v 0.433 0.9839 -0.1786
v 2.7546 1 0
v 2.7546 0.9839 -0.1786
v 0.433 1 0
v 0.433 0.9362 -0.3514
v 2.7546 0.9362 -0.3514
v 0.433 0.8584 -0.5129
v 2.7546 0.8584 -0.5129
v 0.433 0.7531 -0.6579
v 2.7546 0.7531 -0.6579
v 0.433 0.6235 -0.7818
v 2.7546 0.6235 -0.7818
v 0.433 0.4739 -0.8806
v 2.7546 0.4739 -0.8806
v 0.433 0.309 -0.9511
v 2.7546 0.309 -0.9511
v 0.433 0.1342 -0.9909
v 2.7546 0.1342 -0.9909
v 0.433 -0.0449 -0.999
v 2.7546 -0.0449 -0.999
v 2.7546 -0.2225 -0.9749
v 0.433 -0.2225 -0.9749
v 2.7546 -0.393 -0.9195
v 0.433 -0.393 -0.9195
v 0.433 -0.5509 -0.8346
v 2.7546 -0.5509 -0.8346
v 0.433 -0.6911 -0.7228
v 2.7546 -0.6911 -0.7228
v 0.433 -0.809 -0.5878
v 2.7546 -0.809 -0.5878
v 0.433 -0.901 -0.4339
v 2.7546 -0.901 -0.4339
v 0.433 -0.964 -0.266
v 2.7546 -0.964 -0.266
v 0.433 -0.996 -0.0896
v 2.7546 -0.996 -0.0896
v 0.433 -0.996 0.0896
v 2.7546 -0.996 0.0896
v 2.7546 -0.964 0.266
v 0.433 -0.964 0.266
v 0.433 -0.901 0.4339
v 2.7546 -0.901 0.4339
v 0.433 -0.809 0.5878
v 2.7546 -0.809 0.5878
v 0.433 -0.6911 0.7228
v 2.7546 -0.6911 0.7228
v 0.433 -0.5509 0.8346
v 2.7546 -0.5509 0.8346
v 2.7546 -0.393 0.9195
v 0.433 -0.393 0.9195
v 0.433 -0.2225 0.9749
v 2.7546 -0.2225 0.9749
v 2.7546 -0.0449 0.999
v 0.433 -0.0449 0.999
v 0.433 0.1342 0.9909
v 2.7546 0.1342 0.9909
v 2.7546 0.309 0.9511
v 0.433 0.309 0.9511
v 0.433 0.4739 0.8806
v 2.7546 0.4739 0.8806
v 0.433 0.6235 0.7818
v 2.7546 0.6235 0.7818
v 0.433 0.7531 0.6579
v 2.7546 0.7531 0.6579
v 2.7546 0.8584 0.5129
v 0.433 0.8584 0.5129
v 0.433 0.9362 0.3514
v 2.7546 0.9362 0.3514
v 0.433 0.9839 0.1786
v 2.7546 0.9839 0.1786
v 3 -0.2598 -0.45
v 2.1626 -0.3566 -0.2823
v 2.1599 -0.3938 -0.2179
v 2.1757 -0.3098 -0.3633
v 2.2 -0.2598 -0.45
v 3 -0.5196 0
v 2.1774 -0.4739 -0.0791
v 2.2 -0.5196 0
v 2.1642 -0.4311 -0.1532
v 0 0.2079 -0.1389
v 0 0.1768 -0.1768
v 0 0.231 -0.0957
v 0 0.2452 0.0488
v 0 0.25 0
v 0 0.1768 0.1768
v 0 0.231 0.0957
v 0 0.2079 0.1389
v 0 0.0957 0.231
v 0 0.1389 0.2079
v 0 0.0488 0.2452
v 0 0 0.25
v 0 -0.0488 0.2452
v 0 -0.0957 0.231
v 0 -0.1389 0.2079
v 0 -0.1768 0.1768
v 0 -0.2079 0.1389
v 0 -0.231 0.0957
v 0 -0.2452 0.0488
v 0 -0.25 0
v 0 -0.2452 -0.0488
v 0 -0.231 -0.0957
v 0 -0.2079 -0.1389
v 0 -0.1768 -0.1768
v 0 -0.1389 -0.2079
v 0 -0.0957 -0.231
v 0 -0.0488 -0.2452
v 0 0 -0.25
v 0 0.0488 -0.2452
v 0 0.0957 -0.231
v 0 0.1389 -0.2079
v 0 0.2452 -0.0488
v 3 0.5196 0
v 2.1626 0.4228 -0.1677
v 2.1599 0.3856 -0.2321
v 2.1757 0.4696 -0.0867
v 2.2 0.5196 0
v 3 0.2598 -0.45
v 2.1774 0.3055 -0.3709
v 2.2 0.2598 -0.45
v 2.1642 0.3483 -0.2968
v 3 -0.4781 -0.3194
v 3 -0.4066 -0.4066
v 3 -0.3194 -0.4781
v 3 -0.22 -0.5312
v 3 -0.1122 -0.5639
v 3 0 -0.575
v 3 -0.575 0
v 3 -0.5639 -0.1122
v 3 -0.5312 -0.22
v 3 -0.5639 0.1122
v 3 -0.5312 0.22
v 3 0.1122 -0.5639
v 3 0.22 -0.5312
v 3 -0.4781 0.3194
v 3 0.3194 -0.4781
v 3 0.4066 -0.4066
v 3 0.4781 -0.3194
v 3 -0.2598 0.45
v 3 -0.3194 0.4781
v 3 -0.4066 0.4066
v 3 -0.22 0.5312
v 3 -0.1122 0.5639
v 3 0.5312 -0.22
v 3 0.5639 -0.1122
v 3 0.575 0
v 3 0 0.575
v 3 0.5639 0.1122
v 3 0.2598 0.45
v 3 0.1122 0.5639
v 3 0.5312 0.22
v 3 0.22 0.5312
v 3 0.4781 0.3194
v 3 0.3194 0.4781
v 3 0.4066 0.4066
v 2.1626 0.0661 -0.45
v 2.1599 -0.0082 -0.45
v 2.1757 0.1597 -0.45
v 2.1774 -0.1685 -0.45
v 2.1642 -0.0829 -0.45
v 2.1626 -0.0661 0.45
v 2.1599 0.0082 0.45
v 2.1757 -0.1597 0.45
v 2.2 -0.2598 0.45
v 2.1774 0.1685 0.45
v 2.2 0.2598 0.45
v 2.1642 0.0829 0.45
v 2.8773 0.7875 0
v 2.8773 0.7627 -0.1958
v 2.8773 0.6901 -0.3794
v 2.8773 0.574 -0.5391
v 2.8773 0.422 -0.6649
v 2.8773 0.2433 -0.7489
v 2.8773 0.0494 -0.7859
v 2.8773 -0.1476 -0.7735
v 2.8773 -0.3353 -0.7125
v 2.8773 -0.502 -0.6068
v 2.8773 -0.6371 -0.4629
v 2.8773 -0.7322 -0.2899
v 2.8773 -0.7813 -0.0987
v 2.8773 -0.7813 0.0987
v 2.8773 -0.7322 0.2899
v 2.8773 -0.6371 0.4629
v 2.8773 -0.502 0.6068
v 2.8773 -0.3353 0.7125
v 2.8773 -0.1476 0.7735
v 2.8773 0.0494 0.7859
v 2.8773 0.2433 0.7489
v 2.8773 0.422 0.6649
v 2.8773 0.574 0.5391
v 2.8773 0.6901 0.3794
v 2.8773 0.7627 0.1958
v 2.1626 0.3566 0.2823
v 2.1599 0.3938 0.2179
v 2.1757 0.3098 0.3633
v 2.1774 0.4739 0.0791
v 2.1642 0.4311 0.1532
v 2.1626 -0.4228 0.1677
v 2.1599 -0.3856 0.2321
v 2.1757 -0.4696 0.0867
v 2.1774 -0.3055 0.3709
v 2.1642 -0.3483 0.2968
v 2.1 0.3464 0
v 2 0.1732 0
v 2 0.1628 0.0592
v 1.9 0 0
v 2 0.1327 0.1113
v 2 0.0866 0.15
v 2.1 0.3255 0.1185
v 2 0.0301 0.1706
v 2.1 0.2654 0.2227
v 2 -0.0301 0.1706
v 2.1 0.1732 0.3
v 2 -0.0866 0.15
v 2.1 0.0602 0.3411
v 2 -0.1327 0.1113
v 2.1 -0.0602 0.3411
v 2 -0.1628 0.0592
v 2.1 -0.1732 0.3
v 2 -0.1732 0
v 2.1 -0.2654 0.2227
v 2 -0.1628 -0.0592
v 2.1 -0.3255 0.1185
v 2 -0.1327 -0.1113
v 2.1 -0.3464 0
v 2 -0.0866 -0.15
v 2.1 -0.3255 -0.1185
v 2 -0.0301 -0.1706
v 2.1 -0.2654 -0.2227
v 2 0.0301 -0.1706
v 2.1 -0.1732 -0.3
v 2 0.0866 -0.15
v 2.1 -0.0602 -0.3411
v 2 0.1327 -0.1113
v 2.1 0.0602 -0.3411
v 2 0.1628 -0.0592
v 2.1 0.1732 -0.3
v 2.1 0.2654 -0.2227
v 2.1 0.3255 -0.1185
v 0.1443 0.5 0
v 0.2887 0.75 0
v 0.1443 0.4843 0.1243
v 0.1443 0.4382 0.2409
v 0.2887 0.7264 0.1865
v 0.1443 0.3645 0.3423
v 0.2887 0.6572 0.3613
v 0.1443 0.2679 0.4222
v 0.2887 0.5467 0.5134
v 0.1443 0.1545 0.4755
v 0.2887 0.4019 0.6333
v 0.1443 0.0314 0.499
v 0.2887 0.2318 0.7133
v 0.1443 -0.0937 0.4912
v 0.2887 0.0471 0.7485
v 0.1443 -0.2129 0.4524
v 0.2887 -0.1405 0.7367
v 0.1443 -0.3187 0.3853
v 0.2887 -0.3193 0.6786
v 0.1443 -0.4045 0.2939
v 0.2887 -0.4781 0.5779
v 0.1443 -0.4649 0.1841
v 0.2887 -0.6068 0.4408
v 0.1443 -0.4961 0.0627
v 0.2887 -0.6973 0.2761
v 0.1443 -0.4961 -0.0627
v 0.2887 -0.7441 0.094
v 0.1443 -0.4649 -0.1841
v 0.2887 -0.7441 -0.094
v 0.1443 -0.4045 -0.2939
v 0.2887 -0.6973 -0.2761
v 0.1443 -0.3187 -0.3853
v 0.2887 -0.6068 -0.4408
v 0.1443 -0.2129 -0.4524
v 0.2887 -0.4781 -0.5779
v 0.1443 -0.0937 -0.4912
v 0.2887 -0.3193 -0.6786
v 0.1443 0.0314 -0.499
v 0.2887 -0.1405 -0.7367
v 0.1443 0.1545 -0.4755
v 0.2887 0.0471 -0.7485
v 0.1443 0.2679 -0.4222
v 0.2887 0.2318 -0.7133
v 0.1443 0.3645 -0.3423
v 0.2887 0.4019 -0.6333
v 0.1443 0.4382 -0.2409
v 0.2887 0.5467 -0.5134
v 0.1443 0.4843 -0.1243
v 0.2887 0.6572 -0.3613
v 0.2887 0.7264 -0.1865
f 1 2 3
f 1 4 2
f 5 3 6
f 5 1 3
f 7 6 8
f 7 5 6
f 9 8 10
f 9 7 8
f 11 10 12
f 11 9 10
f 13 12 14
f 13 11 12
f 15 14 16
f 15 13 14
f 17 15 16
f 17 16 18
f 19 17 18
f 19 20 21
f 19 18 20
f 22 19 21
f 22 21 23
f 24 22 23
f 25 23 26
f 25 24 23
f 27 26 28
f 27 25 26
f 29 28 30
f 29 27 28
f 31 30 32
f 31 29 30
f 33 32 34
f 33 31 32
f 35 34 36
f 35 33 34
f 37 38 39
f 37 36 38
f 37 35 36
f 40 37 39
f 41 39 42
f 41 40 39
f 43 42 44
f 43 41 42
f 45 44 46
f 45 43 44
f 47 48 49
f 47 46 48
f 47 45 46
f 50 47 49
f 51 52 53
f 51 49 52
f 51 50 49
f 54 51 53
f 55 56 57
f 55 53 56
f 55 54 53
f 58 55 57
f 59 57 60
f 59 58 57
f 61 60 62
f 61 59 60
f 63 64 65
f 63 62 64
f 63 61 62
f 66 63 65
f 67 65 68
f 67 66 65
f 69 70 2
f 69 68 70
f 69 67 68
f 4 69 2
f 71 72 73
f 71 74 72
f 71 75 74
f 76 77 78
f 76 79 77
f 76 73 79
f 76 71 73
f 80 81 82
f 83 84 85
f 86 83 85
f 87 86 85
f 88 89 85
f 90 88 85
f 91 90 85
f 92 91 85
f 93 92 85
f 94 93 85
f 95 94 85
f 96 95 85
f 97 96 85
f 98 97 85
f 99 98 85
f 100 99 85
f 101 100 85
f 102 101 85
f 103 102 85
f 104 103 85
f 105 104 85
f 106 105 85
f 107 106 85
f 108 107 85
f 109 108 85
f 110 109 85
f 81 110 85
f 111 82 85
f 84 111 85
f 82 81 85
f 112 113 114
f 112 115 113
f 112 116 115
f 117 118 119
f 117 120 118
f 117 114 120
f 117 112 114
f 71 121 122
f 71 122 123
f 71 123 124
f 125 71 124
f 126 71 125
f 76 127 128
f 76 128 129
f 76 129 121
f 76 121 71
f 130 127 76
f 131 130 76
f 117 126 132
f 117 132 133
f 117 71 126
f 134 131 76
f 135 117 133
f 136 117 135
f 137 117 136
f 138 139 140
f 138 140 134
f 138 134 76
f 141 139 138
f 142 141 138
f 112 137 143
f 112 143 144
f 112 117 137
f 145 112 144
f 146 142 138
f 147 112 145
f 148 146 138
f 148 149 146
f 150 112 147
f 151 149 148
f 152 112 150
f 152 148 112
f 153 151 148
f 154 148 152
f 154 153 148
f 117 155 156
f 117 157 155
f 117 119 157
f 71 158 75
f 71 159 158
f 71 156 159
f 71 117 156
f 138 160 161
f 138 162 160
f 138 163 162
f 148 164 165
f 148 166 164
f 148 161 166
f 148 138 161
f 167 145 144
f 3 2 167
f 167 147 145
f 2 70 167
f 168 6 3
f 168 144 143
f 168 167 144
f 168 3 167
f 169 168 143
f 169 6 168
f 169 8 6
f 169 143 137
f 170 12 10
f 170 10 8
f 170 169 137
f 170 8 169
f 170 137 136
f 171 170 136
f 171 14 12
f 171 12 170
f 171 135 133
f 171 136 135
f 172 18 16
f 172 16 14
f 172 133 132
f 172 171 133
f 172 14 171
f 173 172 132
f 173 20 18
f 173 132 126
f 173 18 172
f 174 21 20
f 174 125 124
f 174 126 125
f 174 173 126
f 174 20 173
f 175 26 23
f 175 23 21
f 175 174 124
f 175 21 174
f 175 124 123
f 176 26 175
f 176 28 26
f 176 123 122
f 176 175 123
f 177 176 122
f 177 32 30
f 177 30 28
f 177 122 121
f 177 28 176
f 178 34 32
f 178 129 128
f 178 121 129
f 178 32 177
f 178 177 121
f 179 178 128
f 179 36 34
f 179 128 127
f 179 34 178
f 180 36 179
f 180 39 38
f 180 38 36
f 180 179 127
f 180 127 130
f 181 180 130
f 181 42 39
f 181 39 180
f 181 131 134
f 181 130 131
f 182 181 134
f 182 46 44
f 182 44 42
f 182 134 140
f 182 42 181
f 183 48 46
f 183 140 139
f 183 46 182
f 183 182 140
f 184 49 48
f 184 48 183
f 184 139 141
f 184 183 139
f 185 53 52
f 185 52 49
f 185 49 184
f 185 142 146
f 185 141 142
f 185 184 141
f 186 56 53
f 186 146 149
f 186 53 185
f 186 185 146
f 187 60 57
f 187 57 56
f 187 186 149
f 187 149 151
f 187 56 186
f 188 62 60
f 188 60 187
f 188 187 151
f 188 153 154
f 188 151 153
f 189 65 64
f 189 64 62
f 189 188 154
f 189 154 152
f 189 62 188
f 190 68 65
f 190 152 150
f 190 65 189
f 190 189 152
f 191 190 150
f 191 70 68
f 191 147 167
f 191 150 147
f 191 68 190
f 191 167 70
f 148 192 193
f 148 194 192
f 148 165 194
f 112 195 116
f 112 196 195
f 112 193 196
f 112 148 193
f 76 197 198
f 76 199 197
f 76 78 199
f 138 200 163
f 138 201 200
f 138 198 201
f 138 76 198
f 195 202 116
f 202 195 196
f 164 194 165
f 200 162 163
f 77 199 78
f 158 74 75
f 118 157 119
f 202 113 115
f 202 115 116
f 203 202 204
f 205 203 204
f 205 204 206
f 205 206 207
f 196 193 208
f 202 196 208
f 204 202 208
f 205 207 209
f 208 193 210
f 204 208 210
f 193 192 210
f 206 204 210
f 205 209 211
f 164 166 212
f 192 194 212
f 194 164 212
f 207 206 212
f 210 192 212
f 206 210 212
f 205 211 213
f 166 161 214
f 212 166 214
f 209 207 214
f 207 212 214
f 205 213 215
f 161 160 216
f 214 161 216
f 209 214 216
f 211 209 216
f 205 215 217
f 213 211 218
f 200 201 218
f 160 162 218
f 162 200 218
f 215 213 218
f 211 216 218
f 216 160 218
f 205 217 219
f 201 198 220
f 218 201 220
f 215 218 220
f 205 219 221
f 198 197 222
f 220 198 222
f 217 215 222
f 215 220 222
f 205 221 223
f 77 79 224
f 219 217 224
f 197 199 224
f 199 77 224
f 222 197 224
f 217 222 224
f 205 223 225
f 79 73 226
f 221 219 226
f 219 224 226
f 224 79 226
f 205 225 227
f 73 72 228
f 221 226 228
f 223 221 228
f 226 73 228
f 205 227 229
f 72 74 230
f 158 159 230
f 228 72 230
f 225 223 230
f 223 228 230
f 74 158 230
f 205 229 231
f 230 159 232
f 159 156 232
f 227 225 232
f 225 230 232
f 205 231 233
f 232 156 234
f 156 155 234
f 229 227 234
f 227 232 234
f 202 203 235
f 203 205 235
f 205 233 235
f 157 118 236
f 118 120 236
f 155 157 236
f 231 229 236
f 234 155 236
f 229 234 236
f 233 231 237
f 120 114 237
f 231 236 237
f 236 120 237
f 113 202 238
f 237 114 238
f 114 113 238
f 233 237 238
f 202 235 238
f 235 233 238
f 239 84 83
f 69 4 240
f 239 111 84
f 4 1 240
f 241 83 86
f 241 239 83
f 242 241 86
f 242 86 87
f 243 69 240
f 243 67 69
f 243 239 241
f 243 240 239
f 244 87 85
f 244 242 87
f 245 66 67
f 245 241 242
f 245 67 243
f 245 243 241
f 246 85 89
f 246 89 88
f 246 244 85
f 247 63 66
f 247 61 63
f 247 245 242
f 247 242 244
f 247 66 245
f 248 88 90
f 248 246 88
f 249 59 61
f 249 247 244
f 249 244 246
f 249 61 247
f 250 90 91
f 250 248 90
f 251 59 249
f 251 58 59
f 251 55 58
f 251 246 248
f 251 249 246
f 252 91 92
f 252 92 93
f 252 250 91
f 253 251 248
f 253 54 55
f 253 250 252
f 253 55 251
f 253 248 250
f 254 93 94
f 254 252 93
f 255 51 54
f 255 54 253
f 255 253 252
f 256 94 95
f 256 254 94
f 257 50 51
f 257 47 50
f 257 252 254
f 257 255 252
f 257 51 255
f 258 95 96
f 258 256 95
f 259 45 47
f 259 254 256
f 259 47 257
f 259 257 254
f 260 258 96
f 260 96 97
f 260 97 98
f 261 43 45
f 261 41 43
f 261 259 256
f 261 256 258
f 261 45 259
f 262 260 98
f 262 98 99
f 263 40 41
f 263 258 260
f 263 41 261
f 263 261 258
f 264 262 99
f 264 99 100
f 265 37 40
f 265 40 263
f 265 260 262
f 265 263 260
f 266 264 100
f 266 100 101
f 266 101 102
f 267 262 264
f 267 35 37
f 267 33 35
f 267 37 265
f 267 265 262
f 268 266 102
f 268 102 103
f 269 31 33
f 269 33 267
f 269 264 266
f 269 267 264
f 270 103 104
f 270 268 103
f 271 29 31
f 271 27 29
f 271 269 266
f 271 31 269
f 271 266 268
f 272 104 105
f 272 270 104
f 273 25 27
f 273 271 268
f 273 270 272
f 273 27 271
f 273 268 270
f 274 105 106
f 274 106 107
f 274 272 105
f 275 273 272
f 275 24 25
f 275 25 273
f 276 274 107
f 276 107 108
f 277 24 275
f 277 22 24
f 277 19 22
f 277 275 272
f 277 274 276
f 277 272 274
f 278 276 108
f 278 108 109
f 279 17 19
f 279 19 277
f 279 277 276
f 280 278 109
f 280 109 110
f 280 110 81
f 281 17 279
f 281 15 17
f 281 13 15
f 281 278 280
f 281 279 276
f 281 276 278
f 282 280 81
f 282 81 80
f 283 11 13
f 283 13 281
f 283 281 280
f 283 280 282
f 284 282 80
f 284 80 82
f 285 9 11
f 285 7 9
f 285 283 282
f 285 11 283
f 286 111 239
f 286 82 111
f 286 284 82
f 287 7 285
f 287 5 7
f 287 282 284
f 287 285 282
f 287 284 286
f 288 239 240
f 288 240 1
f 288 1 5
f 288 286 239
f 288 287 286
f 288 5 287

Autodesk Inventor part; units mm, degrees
ref_plane "YZ Plane" through (0, 0, 0) normal (1, 0, 0) x (0, 1, 0)
ref_plane "XZ Plane" through (0, 0, 0) normal (0, 1, 0) x (-1, 0, 0)
sketch "Skizze1" plane through (0, 0, 0) normal (0, 0, 1) x (1, 0, 0)
  line L0 (0, 0) -> (1.9, 0)
  line L1 (3, 0.5196) -> (3, 1)
  line L2 (3, 1) -> (0, 1)
  line L3 (3, 0.5196) -> (2.2, 0.5196)
  line L4 (2.2, 0.5196) -> (1.9, 0)
  line L5 (0, -0.2) -> (0, 1.2) projected
  line L6 (0, 1) -> (0, 0)
  dimension "d0" = 0.8
  dimension "d1" = 60
  dimension "d2" = 2
  dimension "d3" = 1.0392
  dimension "d5" = 3
revolve "Körper" add sketch "Skizze1" angle 360 about axis through (0, 0, 0) along (1, 0, 0)
sketch "Skizze2" plane through (3, 0, 0) normal (1, 0, 0) x (0, 1, 0)
  circle A0 centre (0, 0) radius 0.5196 projected
  line L0 (-0.2598, 0.45) -> (0.2598, 0.45)
  line L1 (0.2598, 0.45) -> (0.5196, 0)
  line L2 (0.5196, 0) -> (0.2598, -0.45)
  line L3 (0.2598, -0.45) -> (-0.2598, -0.45)
  line L4 (-0.2598, -0.45) -> (-0.5196, 0)
  line L5 (-0.5196, 0) -> (-0.2598, 0.45)
  point P0 (0, 0)
  point P1 (0, 0)
extrude "Loch" add sketch "Skizze2" against normal up to next contours L1 A0 | A0 L2 | L0 A0 | A0 L3 | L5 A0 | A0 L4
thread "Gewinde" size "M2x0.4" class "6g" standard "ISO Metric profile" length 3
chamfer "Fase1" distance 0.433 angle 60 1 edges at (0, -1, 0) measured on face at (2, 0.9871, -0.1604)
chamfer "Fase2" distance 0.2454 angle 60 1 edges at (3, -1, 0) measured on face at (2.1443, 0.9968, -0.0805)
ref_plane "Work Plane1" through (1.5, 0, 0) normal (0, 0, 1) x (1, 0, 0)
equation "\"d0\" = INTI"
equation "\"d2\" = NND"
equation "\"d3\" = 1.1547 * SW"
equation "\"d5\" = NLG"
equation "\"d12\" = NLG"
equation "\"d9\" = FAWI"
equation "\"d10\" = -0.5 * GD1 + 0.5 * NND"
equation "\"d11\" = FAWI"
equation "\"d35\" = -0.5 * GD1 + 0.5 * NND"
equation "\"NND\" = 2"
equation "\"NLG\" = 3"
equation "\"INTI\" = 0.8"
equation "\"FAWI\" = 60deg"
equation "\"SW\" = 0.9"
equation "\"GD1\" = THREADDIA - 1.2269 * PTC"
equation "\"FAWI1\" = 45deg"
equation "\"SPD\" = 0.5"
equation "\"GUL\" = 0.61345 * PTC"
equation "\"TOA\" = 30deg"
equation "\"THREADDIA\" = 2"
equation "\"PTC\" = 0.4"
equation "\"GAL\" = 0.61345 * PTC"
equation "\"E0\" = 1.155 * SW"
properties part number "ISO 4027 - M2 x 3" material "Edelstahl, 440C"
